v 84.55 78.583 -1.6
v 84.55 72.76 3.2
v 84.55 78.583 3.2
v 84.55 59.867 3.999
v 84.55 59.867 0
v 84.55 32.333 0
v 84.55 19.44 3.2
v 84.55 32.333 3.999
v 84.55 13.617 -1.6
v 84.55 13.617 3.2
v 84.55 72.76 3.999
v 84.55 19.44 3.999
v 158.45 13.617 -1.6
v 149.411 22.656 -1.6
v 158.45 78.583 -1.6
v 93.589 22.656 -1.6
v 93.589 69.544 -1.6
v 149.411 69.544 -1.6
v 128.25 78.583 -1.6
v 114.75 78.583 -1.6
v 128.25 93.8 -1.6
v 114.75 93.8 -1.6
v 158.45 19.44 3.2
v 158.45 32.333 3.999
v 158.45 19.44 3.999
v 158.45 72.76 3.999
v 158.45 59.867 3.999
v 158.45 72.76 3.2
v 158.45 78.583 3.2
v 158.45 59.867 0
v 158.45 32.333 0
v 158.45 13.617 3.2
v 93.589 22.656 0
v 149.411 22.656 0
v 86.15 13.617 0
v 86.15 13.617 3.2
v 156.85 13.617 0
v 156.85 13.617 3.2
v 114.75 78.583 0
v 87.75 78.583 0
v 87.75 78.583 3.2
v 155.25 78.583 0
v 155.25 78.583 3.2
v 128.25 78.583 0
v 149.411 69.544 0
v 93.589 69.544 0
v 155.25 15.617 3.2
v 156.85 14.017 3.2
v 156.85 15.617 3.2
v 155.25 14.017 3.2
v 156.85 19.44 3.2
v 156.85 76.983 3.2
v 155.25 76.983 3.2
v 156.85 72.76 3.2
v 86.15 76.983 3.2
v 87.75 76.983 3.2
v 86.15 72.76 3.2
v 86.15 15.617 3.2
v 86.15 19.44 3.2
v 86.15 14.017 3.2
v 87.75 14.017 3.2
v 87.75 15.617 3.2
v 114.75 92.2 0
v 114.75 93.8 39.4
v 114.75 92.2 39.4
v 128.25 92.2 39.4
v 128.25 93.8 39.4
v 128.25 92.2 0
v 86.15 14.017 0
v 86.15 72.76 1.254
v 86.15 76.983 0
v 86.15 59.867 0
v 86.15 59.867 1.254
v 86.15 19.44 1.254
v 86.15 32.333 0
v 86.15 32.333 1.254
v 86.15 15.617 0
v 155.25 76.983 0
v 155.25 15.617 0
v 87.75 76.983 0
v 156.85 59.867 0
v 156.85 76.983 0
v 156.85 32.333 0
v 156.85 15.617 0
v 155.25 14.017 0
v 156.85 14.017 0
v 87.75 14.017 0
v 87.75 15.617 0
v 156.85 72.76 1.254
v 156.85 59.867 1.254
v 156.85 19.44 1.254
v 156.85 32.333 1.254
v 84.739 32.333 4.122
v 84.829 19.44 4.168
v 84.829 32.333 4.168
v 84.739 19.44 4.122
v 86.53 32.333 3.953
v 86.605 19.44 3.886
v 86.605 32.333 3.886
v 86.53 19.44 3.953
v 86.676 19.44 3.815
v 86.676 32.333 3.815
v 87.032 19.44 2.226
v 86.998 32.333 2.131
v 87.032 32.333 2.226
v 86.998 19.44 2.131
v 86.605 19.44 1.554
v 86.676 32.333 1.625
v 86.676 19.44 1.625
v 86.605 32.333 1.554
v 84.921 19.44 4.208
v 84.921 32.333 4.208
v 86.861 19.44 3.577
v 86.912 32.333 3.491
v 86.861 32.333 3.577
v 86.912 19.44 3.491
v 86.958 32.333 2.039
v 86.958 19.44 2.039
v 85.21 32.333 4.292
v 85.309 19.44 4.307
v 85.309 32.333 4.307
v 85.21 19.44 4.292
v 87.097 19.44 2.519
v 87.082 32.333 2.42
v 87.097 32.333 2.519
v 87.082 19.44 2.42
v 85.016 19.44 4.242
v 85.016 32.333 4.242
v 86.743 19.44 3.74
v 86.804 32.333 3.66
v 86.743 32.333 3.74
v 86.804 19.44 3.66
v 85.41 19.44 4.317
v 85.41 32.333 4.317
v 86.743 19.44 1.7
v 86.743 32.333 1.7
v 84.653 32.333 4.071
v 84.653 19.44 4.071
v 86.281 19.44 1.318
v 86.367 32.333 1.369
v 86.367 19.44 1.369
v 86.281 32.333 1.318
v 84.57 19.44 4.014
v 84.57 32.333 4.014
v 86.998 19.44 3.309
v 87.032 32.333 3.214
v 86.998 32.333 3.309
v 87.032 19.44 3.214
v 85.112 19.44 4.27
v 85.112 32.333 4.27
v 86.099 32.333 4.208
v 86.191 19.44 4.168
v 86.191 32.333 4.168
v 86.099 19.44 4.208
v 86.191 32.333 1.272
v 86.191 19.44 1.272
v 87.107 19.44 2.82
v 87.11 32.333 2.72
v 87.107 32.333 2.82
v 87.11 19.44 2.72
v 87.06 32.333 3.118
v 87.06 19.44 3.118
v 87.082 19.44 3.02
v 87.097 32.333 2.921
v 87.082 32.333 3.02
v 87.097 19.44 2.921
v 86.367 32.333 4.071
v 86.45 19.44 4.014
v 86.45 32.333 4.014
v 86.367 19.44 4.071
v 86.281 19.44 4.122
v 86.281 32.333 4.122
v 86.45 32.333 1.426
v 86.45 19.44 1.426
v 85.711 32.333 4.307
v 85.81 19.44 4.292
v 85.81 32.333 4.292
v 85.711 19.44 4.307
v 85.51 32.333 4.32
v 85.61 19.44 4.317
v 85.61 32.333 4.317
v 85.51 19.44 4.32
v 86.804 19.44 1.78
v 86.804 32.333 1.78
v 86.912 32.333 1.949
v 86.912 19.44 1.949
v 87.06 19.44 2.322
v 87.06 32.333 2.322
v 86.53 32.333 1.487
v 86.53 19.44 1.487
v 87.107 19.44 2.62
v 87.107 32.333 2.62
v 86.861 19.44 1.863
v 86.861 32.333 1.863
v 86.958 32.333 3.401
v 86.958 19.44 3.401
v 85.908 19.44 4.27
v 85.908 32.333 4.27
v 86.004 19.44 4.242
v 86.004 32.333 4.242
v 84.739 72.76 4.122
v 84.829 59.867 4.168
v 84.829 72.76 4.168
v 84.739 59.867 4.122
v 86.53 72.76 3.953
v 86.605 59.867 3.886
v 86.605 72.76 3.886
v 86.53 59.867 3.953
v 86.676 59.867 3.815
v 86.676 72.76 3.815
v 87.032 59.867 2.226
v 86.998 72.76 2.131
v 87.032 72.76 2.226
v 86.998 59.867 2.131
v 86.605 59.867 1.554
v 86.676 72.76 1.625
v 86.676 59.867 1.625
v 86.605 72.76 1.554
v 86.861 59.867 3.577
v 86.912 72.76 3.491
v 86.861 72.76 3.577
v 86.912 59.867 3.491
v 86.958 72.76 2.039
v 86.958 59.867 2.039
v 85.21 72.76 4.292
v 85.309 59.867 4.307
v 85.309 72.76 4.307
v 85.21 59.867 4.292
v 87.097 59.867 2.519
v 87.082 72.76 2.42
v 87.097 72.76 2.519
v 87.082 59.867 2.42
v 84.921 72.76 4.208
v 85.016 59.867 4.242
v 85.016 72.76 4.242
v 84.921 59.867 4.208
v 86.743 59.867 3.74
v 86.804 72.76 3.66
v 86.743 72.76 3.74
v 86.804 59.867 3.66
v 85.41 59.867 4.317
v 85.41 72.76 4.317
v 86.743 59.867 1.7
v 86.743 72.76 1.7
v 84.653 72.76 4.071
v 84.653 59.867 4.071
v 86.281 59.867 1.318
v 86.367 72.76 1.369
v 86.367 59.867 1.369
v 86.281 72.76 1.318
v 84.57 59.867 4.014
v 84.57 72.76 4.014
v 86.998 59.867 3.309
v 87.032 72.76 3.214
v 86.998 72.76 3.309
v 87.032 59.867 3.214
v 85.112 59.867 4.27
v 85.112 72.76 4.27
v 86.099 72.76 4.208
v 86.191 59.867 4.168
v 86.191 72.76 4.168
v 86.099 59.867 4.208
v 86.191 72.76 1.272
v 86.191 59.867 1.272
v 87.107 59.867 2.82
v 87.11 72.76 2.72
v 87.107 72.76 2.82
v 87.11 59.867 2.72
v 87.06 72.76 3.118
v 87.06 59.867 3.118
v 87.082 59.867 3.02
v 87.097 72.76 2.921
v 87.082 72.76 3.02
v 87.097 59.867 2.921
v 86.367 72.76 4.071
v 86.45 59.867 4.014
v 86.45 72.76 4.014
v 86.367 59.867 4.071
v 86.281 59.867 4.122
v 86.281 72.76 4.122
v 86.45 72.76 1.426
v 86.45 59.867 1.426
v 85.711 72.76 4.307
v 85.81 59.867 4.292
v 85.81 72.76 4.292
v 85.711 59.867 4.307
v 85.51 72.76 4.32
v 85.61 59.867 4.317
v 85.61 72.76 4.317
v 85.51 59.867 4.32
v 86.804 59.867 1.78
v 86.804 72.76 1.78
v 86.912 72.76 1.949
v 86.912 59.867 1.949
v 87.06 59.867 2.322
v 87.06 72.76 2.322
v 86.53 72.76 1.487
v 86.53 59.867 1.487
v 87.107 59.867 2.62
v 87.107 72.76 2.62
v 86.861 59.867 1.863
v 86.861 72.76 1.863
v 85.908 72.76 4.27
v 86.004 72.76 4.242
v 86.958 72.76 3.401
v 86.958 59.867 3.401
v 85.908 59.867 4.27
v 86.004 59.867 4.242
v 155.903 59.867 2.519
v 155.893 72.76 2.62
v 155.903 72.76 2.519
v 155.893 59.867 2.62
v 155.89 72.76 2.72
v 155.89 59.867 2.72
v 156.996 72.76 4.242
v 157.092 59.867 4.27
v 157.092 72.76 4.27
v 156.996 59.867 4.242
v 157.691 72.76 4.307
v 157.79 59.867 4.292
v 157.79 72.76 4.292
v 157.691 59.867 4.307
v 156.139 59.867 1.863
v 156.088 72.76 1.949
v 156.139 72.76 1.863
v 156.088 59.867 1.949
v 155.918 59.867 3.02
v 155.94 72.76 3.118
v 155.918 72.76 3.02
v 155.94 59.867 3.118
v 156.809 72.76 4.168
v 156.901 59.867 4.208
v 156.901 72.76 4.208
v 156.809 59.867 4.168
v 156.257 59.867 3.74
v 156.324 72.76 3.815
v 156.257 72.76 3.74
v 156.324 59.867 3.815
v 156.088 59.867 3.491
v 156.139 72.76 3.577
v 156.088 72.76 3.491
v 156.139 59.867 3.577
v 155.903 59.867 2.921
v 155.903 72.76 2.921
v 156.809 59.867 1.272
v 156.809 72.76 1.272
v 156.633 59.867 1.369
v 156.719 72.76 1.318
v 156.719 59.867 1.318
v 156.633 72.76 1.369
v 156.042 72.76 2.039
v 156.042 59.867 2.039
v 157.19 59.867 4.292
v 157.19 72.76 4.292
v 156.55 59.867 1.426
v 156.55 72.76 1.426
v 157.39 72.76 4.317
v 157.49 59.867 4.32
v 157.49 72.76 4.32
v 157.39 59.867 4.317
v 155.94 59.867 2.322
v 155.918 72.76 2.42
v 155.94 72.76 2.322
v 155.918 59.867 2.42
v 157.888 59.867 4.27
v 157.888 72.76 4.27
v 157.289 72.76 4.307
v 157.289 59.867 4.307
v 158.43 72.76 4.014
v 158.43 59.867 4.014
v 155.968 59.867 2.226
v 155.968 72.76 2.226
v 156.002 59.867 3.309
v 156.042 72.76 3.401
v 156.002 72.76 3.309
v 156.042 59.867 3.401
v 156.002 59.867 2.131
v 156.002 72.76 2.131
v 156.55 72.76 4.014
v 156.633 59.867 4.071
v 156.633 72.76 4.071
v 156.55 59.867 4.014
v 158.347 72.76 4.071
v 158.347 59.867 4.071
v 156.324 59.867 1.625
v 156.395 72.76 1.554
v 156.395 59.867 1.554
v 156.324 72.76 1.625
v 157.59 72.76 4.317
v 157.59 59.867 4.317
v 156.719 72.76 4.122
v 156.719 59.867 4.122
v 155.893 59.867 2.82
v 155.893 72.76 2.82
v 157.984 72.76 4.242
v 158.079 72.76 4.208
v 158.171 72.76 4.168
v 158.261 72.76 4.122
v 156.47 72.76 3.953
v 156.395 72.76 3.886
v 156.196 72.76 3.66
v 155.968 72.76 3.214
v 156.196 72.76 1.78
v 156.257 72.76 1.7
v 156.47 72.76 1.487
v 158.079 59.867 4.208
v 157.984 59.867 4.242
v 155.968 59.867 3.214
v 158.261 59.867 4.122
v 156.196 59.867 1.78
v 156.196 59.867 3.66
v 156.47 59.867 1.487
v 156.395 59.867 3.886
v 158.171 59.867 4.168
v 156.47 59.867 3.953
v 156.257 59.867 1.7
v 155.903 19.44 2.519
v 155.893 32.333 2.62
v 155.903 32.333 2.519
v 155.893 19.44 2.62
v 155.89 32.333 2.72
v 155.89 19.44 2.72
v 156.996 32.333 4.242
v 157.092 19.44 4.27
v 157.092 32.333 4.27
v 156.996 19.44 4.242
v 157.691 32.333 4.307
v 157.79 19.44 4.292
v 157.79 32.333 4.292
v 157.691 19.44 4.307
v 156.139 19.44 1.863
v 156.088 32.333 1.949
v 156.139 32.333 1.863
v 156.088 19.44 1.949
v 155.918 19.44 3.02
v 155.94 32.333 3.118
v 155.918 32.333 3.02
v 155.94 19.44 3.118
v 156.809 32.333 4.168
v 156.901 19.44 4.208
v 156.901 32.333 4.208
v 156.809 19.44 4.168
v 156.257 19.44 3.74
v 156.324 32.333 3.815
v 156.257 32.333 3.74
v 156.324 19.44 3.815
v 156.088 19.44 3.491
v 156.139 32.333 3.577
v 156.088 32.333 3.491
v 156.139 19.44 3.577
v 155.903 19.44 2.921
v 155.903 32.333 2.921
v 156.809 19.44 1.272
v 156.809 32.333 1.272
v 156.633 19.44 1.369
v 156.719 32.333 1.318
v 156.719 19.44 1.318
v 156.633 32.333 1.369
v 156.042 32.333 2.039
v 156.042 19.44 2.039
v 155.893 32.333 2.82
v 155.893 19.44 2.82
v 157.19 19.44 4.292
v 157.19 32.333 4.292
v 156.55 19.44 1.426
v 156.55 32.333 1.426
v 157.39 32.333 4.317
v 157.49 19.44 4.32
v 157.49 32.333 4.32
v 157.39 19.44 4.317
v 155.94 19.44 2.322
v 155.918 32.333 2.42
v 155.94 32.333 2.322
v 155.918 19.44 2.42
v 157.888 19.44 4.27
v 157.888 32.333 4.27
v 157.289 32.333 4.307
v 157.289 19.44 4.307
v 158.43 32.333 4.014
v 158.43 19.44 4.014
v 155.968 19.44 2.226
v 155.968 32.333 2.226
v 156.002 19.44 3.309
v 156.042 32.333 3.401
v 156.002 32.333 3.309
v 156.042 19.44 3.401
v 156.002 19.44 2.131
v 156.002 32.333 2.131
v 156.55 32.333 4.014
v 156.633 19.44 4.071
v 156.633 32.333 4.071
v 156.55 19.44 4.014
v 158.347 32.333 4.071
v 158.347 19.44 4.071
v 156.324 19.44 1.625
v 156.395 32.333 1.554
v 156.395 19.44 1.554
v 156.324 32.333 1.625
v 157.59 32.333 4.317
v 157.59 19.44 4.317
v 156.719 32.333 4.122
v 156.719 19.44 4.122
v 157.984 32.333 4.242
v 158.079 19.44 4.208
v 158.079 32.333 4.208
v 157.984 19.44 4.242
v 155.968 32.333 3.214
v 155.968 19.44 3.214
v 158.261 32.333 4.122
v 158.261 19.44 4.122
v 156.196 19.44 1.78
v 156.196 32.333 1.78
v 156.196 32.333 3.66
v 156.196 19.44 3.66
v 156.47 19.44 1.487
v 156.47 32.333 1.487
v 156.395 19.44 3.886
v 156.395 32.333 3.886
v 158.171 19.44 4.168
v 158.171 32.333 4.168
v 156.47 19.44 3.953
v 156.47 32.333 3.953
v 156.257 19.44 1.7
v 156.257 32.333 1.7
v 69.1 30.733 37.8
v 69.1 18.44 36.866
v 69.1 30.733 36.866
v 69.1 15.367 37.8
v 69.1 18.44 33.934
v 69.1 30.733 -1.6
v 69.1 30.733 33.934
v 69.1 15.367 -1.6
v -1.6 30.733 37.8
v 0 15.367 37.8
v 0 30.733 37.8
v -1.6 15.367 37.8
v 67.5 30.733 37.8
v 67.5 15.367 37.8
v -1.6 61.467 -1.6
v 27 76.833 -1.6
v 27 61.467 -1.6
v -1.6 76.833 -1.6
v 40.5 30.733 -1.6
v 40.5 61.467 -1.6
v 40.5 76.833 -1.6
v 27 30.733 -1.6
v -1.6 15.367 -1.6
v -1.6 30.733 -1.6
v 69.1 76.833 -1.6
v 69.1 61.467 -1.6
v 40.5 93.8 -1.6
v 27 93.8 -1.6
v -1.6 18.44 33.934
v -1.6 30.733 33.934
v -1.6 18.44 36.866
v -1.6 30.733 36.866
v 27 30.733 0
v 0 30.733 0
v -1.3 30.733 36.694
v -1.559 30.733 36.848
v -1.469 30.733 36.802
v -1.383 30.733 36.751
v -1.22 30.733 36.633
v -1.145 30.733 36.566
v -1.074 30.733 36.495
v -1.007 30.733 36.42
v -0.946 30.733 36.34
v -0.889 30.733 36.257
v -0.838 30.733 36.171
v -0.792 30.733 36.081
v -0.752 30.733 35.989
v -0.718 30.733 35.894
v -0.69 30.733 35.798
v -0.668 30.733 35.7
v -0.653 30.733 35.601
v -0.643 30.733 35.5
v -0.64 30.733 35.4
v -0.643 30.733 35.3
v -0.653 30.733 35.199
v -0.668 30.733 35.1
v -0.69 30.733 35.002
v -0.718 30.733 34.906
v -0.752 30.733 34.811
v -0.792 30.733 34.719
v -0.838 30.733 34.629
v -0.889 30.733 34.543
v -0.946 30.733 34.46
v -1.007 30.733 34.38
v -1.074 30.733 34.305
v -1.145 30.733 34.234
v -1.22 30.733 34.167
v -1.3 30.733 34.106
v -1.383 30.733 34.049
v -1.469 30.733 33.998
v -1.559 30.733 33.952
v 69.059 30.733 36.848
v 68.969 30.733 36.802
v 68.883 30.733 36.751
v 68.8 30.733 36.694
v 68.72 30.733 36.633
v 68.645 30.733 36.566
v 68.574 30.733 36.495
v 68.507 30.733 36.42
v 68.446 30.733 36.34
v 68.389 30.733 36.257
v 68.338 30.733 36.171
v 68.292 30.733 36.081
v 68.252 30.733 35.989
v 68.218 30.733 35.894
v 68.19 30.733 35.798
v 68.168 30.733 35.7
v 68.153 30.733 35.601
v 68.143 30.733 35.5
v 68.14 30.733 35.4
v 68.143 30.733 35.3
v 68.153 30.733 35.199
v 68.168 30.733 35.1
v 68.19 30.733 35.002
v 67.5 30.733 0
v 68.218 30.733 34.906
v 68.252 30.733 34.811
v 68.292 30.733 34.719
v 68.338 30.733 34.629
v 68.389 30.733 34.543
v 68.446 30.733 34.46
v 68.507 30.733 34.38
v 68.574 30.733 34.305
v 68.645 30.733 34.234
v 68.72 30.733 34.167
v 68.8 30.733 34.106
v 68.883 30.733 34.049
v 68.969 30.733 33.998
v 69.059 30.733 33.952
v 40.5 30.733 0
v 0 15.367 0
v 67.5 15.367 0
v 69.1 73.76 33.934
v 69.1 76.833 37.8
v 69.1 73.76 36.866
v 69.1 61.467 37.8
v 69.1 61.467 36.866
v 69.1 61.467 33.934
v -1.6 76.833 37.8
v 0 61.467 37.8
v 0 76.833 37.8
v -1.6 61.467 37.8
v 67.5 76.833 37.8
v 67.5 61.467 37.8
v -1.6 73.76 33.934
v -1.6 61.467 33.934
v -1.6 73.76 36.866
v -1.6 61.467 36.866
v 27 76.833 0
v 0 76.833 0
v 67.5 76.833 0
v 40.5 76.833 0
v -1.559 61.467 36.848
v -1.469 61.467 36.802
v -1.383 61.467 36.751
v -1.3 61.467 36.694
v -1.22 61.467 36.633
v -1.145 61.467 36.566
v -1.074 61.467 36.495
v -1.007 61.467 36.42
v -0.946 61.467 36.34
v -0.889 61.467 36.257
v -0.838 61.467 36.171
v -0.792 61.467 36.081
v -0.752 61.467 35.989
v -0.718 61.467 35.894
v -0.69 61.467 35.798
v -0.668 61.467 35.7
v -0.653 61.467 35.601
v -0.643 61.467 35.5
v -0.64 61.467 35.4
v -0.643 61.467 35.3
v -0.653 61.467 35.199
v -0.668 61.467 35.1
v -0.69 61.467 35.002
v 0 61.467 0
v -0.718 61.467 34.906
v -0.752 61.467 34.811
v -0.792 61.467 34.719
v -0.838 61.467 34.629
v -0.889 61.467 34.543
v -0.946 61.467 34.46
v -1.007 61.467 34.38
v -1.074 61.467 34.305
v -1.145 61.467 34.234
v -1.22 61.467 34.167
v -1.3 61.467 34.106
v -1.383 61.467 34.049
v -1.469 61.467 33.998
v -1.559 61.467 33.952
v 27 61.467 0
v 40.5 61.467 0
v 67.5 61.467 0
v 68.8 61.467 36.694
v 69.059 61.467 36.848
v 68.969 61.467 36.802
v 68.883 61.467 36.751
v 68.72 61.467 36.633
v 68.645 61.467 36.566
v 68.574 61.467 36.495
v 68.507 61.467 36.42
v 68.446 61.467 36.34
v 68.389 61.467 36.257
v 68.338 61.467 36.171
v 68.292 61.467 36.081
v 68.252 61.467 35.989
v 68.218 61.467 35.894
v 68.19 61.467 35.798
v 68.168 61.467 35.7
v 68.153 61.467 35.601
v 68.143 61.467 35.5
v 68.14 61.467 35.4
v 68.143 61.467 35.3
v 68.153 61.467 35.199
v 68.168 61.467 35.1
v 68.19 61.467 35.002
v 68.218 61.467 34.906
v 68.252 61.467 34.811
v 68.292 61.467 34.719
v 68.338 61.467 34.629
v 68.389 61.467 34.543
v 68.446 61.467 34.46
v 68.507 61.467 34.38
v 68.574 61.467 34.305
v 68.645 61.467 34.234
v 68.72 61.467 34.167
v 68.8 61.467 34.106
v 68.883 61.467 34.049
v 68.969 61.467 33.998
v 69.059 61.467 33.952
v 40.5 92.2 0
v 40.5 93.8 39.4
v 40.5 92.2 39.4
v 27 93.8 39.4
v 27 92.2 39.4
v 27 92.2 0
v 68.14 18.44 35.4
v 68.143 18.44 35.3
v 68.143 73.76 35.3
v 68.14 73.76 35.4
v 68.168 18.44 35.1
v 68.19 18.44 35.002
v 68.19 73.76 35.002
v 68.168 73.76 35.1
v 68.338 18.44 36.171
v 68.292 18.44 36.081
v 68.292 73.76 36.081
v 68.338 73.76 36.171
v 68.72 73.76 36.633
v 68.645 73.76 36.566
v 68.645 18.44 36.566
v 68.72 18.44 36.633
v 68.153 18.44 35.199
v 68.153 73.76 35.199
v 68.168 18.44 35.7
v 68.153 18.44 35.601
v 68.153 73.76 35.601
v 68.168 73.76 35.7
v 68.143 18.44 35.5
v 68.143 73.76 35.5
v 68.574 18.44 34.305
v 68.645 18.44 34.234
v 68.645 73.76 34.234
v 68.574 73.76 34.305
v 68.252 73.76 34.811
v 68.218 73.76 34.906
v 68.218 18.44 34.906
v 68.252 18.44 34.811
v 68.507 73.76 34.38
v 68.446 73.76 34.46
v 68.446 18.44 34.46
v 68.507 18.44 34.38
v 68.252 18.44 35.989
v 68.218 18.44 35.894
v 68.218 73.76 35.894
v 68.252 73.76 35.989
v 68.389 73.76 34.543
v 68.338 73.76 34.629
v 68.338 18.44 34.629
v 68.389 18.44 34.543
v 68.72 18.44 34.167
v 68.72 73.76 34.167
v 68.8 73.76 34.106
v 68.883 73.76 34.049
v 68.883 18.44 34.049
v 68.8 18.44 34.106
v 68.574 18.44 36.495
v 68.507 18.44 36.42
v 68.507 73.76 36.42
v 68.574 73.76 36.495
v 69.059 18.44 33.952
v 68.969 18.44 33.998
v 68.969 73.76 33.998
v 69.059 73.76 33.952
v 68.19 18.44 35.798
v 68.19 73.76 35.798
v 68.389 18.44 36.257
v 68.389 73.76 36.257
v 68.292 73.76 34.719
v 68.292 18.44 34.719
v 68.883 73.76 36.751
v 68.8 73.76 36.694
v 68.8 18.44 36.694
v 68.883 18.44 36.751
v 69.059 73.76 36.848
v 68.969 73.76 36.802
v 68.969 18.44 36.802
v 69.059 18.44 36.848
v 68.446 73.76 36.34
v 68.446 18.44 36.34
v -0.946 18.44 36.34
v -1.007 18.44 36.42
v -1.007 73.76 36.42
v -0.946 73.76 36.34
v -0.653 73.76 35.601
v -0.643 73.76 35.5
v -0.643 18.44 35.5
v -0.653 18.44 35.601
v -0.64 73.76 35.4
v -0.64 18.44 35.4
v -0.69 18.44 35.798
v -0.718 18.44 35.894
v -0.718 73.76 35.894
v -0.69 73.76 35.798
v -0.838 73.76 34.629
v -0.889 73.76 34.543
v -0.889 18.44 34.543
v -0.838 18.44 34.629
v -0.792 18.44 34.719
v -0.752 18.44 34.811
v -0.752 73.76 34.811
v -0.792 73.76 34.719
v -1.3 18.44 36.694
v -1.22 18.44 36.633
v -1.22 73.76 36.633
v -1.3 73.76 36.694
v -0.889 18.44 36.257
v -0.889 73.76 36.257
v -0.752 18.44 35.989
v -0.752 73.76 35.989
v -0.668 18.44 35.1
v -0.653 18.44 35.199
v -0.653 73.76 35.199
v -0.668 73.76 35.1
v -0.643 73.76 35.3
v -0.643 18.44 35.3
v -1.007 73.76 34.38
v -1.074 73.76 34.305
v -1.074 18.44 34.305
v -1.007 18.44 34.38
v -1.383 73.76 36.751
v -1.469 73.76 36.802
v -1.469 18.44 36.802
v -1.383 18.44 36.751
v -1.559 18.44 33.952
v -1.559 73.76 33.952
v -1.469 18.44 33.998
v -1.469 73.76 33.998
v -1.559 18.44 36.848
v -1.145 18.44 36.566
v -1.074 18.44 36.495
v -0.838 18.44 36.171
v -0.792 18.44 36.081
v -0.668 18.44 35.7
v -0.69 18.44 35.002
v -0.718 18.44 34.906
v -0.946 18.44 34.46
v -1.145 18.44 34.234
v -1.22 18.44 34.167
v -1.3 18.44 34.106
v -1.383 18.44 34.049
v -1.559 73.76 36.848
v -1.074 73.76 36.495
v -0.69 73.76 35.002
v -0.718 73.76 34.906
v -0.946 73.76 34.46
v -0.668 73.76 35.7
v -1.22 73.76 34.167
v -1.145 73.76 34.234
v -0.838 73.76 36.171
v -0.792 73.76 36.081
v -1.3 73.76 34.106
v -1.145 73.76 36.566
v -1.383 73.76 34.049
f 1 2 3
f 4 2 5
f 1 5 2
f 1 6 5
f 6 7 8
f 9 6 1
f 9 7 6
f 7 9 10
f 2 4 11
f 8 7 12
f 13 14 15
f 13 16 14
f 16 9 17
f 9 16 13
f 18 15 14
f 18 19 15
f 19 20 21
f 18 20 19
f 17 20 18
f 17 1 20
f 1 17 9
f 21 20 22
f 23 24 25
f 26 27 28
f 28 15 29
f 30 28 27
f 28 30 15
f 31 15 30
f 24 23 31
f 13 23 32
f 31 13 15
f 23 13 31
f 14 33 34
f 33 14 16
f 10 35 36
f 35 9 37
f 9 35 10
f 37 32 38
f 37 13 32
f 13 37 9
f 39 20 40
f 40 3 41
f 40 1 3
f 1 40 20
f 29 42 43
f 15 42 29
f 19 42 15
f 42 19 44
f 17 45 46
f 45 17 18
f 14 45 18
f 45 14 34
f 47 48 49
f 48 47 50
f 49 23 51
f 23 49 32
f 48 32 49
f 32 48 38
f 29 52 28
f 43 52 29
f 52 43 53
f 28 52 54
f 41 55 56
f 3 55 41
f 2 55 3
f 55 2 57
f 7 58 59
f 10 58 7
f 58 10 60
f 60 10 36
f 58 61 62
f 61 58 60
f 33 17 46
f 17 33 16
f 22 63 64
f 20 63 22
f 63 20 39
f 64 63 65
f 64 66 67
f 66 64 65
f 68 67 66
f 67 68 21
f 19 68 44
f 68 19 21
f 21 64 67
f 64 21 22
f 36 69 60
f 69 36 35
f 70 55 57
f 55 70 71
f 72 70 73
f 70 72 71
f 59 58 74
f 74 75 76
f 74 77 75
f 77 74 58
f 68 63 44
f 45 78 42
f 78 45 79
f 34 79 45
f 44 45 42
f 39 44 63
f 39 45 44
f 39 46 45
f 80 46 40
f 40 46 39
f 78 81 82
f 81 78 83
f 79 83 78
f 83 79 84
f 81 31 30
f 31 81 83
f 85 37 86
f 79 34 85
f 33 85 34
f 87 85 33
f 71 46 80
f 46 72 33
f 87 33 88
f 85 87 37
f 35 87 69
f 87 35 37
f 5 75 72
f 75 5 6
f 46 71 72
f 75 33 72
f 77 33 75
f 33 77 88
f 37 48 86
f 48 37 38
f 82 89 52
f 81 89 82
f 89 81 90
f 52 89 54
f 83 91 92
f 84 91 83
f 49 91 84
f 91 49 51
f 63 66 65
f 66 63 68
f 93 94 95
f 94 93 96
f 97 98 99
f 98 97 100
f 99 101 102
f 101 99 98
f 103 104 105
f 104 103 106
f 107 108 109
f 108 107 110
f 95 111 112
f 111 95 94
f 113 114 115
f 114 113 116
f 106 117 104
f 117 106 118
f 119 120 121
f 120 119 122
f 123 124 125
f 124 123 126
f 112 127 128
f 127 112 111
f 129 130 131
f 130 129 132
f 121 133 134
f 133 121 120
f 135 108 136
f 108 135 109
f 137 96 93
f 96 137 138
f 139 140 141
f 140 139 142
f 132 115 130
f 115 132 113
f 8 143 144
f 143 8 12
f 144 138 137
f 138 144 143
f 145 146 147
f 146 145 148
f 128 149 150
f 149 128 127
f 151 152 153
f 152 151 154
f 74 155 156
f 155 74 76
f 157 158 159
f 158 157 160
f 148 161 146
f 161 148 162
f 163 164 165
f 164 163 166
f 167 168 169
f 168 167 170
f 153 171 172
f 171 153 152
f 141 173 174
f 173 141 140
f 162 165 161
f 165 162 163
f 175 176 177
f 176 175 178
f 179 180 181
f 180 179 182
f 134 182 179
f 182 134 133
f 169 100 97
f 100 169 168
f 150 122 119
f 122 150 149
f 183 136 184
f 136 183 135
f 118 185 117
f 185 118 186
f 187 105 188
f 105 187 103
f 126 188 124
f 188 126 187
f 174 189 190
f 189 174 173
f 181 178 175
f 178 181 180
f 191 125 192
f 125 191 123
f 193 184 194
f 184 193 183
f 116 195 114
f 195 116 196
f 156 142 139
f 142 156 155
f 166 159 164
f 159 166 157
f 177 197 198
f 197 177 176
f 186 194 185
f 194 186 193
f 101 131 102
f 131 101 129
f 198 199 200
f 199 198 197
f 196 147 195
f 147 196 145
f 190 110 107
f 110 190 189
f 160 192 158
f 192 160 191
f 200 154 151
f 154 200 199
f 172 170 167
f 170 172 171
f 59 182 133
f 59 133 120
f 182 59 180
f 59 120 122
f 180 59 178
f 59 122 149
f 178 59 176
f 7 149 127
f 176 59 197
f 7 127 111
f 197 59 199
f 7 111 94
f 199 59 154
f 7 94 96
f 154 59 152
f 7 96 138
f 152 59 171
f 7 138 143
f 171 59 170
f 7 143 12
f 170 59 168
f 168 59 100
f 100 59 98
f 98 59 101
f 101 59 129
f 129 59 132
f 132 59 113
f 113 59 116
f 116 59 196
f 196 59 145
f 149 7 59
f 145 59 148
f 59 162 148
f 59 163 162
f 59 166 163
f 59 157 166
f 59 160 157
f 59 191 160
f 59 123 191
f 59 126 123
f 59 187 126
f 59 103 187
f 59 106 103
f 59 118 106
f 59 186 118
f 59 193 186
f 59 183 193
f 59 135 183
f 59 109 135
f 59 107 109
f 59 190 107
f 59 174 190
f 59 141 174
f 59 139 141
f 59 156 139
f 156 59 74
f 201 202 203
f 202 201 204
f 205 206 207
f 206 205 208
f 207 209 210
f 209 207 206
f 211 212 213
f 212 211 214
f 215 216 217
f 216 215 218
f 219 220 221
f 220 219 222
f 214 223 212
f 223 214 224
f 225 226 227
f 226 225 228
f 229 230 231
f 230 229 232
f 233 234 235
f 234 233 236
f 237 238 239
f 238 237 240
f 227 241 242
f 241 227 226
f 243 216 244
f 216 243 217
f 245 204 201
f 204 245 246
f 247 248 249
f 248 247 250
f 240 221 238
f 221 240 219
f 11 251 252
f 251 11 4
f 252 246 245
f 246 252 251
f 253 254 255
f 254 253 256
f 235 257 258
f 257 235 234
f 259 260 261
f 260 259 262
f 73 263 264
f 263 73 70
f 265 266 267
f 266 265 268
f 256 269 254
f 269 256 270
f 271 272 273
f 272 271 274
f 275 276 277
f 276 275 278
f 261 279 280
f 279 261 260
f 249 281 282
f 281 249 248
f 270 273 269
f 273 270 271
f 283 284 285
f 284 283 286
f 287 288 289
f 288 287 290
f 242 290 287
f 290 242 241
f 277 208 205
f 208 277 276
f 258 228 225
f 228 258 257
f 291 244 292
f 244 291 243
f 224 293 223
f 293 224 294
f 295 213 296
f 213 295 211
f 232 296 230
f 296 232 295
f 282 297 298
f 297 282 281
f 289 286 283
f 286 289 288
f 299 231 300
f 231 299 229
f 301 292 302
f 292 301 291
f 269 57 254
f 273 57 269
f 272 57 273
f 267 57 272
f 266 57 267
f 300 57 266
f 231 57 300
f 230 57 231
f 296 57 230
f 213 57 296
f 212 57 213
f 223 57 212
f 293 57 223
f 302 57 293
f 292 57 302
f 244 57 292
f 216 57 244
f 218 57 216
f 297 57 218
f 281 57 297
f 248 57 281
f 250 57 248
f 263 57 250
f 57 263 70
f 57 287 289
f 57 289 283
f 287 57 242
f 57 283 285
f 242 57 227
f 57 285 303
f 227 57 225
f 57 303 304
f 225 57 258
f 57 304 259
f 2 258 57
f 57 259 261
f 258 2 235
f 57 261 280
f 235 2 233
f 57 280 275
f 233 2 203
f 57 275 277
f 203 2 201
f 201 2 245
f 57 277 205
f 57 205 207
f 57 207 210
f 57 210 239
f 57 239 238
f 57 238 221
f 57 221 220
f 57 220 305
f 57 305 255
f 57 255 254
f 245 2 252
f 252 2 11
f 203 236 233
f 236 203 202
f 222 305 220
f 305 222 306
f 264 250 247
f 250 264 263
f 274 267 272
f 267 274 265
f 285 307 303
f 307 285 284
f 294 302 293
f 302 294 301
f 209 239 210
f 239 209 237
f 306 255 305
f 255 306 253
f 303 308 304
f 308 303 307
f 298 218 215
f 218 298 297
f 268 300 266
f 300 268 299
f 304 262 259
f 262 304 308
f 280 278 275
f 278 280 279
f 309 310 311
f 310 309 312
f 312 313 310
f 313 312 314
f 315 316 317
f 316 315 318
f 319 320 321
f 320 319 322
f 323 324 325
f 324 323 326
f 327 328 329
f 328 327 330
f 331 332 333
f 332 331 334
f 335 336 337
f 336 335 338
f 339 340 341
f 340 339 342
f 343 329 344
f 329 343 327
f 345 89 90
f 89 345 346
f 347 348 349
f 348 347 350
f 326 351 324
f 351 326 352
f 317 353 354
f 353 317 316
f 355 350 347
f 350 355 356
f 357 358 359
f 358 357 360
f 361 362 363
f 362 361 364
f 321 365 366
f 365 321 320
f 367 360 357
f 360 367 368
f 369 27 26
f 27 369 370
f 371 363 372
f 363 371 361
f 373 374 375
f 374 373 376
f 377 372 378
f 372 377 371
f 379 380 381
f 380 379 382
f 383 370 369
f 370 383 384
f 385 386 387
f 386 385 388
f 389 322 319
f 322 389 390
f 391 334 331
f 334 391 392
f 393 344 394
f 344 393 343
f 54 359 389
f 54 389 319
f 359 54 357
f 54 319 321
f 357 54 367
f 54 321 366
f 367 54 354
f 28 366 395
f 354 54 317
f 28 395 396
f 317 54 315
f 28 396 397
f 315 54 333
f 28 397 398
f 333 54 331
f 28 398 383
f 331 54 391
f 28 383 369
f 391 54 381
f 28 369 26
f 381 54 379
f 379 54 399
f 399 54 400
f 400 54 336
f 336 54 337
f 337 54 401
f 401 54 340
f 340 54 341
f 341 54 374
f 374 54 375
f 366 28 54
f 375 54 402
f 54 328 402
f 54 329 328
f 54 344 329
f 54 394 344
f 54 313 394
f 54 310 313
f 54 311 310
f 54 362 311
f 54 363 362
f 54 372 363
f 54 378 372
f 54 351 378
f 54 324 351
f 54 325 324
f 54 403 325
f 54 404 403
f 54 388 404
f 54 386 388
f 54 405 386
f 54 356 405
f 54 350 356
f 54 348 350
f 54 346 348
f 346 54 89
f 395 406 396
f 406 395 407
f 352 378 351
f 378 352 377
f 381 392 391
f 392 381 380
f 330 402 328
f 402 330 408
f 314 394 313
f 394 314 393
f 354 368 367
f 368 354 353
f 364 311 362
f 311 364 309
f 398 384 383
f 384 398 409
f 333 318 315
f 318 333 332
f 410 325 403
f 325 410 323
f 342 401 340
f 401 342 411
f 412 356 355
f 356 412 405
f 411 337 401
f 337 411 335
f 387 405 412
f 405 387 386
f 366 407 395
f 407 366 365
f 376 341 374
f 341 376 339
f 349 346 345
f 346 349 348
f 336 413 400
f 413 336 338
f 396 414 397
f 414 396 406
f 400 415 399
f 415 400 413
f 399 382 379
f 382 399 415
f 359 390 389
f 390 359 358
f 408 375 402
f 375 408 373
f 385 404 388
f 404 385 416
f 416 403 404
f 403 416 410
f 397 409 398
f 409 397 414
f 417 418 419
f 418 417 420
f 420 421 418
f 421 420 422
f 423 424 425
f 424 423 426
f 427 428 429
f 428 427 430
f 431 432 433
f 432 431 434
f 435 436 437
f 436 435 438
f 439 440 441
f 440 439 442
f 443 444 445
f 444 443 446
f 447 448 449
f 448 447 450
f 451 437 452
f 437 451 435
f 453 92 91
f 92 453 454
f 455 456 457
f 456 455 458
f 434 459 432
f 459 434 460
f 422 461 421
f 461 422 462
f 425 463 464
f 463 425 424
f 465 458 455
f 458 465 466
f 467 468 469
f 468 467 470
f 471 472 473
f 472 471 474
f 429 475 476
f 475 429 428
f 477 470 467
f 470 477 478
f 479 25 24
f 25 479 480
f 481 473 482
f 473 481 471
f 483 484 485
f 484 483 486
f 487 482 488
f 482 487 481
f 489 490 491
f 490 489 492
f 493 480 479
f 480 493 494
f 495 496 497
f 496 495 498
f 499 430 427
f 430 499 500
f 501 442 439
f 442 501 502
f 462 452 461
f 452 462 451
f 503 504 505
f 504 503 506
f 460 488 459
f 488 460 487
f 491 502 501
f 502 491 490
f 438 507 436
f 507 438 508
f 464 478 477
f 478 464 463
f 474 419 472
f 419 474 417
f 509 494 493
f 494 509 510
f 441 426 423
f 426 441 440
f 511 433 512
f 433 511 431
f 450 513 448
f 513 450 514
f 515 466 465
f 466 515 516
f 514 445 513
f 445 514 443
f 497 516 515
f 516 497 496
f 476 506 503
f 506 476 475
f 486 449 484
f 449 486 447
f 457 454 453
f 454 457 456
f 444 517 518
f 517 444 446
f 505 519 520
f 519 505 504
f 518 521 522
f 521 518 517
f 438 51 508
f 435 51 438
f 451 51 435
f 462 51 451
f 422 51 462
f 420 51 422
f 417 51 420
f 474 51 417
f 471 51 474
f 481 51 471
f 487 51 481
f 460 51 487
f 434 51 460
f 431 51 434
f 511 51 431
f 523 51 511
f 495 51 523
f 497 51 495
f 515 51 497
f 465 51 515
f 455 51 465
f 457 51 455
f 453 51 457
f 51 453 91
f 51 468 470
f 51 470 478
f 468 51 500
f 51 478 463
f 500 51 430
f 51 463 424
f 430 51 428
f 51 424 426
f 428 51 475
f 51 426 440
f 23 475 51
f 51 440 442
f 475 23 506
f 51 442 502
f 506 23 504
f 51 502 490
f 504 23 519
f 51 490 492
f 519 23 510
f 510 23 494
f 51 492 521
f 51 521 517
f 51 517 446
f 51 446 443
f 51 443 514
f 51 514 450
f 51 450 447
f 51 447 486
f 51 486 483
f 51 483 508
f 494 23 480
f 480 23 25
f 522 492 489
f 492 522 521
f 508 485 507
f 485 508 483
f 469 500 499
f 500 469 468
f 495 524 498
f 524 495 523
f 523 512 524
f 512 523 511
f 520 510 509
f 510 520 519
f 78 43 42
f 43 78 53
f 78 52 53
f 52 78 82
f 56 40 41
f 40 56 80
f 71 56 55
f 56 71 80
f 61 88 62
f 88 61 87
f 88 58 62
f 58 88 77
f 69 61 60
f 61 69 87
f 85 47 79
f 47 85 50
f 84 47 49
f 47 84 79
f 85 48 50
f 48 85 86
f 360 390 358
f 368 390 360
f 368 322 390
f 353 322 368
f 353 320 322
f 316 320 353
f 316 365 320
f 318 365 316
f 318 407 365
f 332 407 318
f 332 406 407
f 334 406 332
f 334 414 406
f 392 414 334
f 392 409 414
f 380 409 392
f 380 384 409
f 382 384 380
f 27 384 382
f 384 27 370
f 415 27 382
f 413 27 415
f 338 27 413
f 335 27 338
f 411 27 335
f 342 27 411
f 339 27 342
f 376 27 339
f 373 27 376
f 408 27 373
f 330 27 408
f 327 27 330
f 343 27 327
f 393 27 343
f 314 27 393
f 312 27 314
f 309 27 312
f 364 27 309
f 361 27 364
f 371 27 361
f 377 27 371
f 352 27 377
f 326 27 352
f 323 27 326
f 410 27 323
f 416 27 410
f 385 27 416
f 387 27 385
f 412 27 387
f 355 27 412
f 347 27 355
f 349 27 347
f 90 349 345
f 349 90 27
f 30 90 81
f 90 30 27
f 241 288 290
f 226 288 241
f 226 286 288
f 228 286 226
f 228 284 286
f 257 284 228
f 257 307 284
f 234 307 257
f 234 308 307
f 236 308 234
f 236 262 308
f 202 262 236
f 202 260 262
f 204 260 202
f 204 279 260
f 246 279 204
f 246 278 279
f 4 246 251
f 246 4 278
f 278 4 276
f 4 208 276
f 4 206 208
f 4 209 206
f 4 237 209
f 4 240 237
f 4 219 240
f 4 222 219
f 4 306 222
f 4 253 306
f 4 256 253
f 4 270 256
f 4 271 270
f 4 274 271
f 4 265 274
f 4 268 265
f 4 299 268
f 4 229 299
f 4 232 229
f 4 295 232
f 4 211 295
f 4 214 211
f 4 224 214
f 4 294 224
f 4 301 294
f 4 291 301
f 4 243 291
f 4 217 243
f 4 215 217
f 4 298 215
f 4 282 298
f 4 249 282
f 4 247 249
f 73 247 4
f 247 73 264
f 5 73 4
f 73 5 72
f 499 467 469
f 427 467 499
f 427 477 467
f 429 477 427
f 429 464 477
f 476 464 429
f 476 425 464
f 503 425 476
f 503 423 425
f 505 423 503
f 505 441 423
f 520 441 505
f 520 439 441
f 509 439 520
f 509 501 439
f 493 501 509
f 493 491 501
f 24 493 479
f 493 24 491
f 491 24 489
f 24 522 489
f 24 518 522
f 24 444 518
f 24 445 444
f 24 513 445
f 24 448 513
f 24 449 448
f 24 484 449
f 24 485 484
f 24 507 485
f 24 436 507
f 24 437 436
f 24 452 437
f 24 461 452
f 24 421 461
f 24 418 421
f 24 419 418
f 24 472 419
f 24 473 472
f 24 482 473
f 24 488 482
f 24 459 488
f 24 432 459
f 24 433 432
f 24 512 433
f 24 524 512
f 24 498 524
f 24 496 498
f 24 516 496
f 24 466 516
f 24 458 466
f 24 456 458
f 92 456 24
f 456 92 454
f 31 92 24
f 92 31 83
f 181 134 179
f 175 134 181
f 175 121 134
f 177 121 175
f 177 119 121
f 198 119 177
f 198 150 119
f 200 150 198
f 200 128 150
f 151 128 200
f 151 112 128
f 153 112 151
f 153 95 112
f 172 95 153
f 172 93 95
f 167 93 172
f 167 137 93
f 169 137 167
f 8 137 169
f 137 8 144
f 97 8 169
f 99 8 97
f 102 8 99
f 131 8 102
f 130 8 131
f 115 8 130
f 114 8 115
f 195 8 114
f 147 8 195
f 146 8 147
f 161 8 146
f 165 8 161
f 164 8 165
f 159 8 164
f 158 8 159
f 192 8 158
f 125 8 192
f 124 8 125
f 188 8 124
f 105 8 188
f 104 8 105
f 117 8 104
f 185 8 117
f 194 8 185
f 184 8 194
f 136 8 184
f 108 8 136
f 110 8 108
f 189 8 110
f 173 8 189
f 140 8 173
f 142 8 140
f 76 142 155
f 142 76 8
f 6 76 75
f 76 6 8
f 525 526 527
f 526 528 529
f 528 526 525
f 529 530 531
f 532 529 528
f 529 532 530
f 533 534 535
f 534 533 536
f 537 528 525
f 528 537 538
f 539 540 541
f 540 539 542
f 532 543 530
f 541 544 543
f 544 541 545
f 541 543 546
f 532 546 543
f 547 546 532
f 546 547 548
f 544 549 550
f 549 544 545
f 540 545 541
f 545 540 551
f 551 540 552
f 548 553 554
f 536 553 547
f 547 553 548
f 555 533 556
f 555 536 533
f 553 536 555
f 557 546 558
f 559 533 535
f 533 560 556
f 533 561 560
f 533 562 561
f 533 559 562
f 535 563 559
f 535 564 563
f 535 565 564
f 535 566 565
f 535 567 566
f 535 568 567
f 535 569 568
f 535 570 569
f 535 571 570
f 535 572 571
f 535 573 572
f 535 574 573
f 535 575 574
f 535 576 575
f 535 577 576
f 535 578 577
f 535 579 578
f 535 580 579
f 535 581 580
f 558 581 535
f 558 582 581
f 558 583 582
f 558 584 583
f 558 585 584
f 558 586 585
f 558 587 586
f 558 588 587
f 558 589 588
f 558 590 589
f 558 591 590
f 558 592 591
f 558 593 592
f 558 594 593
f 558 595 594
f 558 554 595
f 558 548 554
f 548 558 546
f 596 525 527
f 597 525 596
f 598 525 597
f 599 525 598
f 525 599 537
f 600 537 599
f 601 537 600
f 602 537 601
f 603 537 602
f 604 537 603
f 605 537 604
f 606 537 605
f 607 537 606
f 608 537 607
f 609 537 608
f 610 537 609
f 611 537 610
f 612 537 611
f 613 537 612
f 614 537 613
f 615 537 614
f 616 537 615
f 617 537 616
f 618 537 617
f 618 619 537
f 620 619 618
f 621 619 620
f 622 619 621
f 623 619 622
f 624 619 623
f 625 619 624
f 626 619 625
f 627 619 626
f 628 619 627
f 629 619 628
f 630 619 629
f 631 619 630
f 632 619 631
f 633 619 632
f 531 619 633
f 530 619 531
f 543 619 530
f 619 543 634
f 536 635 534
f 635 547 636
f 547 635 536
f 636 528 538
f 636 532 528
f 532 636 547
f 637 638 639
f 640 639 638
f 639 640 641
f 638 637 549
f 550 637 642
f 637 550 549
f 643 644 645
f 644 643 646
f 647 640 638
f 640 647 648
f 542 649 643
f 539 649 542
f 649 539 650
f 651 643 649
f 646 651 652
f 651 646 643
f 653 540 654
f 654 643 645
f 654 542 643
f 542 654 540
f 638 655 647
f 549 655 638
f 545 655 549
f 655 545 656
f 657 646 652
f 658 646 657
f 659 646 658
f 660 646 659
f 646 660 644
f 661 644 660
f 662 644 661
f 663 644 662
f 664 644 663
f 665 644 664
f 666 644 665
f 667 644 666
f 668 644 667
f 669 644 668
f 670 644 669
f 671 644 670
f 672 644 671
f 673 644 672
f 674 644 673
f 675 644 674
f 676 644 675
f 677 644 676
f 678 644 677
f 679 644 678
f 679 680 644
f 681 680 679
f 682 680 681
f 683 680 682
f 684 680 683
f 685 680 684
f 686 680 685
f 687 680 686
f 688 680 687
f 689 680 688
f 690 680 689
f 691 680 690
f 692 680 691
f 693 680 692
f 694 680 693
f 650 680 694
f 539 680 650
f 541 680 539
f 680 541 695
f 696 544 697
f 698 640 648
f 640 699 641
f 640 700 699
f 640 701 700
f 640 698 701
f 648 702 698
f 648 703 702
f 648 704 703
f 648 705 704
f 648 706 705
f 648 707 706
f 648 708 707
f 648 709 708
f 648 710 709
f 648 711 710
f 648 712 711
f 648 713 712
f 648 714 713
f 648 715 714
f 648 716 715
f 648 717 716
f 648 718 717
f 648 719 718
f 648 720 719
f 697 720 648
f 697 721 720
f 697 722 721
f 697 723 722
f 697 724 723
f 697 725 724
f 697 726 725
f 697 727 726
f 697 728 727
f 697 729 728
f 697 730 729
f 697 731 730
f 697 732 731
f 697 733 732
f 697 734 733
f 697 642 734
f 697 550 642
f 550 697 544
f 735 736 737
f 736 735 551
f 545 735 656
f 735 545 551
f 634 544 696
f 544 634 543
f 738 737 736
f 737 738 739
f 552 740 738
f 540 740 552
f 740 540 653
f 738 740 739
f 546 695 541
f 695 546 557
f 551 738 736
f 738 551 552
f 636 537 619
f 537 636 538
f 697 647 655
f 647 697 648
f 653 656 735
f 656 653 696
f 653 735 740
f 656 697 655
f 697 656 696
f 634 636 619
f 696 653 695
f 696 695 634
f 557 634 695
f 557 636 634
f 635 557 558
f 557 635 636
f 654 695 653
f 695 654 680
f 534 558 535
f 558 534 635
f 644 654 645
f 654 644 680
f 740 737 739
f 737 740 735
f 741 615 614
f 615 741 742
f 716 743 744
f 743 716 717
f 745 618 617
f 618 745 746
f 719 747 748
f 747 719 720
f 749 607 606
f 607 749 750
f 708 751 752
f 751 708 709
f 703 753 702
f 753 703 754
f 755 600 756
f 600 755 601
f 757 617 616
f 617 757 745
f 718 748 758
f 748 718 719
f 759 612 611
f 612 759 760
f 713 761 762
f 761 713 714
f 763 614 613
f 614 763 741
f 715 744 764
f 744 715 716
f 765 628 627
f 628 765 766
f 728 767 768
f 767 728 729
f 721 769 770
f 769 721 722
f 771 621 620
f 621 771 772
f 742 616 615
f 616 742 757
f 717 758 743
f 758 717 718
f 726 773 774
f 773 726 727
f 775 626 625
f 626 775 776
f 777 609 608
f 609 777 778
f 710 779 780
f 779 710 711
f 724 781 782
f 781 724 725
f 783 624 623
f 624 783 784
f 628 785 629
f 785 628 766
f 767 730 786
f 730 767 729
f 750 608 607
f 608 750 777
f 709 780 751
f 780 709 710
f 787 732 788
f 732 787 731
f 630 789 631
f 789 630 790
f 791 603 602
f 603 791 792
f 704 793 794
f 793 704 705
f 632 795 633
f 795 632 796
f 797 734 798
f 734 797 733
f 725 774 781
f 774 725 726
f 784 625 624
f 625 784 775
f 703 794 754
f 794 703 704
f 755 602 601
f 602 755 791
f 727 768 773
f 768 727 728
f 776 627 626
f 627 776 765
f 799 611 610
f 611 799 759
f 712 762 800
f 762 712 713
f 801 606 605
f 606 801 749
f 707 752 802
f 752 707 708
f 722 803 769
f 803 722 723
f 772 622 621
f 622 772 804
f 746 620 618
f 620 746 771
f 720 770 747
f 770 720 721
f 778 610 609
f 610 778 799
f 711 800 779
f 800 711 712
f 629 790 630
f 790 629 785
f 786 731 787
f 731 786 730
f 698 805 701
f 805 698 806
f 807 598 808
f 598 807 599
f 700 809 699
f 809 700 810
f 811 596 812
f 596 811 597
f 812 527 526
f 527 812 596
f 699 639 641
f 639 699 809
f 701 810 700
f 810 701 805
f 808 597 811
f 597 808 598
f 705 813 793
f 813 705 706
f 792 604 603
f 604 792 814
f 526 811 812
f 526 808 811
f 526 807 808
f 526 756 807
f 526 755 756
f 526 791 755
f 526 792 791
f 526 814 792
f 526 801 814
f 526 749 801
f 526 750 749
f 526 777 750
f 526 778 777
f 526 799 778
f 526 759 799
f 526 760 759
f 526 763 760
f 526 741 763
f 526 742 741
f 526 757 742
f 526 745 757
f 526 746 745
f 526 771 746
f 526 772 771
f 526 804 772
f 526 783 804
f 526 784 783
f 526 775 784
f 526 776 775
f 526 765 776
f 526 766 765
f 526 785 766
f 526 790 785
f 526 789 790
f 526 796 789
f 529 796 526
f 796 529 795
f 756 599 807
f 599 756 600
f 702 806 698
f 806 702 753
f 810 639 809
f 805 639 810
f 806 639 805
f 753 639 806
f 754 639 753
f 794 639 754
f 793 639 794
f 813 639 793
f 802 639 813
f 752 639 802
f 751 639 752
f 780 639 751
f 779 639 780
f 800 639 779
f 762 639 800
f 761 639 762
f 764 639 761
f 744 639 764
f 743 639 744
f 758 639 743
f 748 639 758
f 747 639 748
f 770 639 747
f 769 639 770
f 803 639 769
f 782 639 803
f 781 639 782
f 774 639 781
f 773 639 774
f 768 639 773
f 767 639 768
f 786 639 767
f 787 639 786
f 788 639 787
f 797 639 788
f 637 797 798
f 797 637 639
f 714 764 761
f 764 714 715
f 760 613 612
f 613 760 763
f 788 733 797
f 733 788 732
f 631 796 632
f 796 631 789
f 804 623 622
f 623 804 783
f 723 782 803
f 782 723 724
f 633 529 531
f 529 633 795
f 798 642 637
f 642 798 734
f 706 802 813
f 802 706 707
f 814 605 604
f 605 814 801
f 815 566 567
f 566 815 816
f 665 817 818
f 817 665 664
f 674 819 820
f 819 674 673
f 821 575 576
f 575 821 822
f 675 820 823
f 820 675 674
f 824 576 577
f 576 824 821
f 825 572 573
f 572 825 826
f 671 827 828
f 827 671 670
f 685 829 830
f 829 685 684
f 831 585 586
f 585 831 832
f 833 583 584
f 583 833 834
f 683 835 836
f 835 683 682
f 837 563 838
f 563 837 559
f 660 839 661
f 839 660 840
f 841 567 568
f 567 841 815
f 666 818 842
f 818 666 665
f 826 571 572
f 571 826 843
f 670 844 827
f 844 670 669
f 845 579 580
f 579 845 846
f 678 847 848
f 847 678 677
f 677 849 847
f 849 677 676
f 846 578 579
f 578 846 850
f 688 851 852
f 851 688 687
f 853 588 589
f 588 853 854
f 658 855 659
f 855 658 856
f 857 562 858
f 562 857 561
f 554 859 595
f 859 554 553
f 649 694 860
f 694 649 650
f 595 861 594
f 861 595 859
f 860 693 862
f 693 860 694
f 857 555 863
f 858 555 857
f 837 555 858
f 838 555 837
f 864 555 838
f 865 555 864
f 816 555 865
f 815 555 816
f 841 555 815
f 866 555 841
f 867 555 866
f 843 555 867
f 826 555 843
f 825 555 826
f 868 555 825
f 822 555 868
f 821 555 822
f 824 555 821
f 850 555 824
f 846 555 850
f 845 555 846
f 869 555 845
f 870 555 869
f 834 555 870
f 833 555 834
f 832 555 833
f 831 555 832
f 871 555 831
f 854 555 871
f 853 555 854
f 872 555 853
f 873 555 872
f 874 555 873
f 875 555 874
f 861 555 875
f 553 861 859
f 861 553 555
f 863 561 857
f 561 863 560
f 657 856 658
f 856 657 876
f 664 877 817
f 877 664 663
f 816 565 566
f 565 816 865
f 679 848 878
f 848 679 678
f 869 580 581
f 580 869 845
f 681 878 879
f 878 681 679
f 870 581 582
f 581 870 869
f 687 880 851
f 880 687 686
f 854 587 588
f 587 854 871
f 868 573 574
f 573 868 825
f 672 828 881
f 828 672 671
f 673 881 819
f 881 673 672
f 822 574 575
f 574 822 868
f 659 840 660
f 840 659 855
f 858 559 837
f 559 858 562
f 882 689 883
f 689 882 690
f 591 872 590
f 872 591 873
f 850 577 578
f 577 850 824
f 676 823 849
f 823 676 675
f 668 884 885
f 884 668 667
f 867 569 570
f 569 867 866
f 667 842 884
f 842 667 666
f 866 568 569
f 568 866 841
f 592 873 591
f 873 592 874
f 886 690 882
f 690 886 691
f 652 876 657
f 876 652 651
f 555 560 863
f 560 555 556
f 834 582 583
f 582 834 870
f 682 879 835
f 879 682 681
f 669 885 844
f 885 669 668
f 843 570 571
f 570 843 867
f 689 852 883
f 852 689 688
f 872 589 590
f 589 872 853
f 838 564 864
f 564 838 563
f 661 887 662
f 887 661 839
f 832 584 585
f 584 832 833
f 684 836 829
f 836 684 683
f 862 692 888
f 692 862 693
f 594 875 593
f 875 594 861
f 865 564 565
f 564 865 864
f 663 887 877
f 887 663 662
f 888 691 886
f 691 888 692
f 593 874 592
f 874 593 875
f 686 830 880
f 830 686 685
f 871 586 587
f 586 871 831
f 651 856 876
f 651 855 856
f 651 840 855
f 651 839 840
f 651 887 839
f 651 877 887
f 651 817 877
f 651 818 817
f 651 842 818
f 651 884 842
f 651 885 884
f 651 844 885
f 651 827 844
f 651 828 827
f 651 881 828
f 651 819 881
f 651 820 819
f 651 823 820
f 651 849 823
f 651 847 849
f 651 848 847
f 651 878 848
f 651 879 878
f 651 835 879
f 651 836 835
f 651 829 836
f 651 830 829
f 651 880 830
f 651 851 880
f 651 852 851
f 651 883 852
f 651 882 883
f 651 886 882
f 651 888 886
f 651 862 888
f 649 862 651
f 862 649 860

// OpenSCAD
// SDE big cards sleeved : 66*90.7 tol 1.5

// Width of a card
card_width = 66;
// Length of a card
card_length = 90.7;
// Total height of the stack of cards you need a box for
stack_height = 36.3;
// The size of the support that will go beneath the card box
support_size = 28;
// This value will be added to the width, length and height. It should probably never be 0 if your values are precise.
tolerance = 1.5;
// The thickness of the printed parts, 1.6 is good for a 0.4 nozzle with a shell thikness of 0.8
thickness = 1.6;
// Which parts do you want to print ?
wut2print = "boxncover"; // [box:Bottom part,lid:Lid,boxncover:Bottom and lid,support:Support,every:Everything]


print_part();

cardwidth = card_width;
cardlength = card_length;
cardheight = stack_height;
support = support_size;

tol = tolerance;
thick1 = thickness;

cardw1 = cardwidth+tol;
cardl1 = cardlength+tol;
cardh1 = cardheight+tol;
cardldiv1 = cardl1/6;
cardwdiv1 = cardw1/5;

module print_part(){

if (wut2print == "box") {
bottom(cardw1, cardl1, cardh1, thick1, cardldiv1, cardwdiv1);
}
else if (wut2print == "lid") {
    translate([cardw1*2.3,0,cardh1]) rotate([0,180,0]) top(cardw1, cardl1, cardh1, thick1, cardldiv1, cardwdiv1);
}
else if (wut2print == "boxncover") {
    translate([cardw1*2.3,0,cardh1]) rotate([0,180,0]) top(cardw1, cardl1, cardh1, thick1, cardldiv1, cardwdiv1);
    bottom(cardw1, cardl1, cardh1, thick1, cardldiv1, cardwdiv1);
}
else if (wut2print == "support") {
support(cardw1, cardl1, cardh1, thick1, cardldiv1, cardwdiv1, support);
}
else if (wut2print == "every") {
    bottom(cardw1, cardl1, cardh1, thick1, cardldiv1, cardwdiv1);
    translate([cardw1*2.3,0,cardh1]) rotate([0,180,0]) top(cardw1, cardl1, cardh1, thick1, cardldiv1, cardwdiv1);
    translate([0,-cardldiv1*5,support]) support(cardw1, cardl1, cardh1, thick1, cardldiv1, cardwdiv1, support);
}

}


module bottom(cardw, cardl, cardh, thick, cardldiv, cardwdiv)
{
    difference(){
    union(){
        translate([-thick,cardldiv,-thick]) cube([cardw+thick*2,cardldiv,cardh+thick]);
        translate([-thick,cardldiv*4,-thick]) cube([cardw+thick*2,cardldiv,cardh+thick]);
        translate([cardwdiv*2,cardldiv,-thick]) cube([cardwdiv,cardl-cardldiv+thick,cardh+thick*2]);
    }
    translate([0,-5,0]) cube([cardw,cardl+5,cardh+5]);
    translate([cardw+thick*1.4,cardldiv*5-cardldiv/5,cardh-thick*1.5]) rotate([90,0,0]) cylinder($fn = 100, r = thick, h = cardldiv*4-2*(cardldiv/5));
    translate([-thick*1.4,cardldiv*5-cardldiv/5,cardh-thick*1.5]) rotate([90,0,0]) cylinder($fn = 100, r = thick, h = cardldiv*4-2*(cardldiv/5));
    }
}

module top(cardw, cardl, cardh, thick, cardldiv, cardwdiv)
{
difference(){
union(){
    difference(){
        union(){
            translate([-thick*2,cardldiv1-thick-tol/10,cardh-thick]) cube([cardw+thick*4,cardldiv1/1.7,thick*2]);
            translate([-thick*2,cardldiv1*5-cardldiv1/1.7+thick+tol/10,cardh-thick]) cube([cardw+thick*4,cardldiv1/1.7,thick*2]);
            translate([-thick*2,cardldiv1-thick-tol/10,cardh-thick*2]) cube([cardldiv1/1.7,cardldiv1*4+thick*2+tol/5,thick*3]);
            translate([cardw+thick*2-cardldiv1/1.7,cardldiv1-thick-tol/10,cardh-thick*2]) cube([cardldiv1/1.7,cardldiv1*4+thick*2+tol/5,thick*3]);
            translate([cardwdiv*2,cardldiv1*5-cardldiv1/1.7+thick+tol/10,-thick]) cube([cardwdiv,cardl1-(cardldiv1*5-cardldiv1/1.7+thick+tol/10)+thick,cardh+thick*2]);
        }
        translate([-thick,0,-thick*2]) cube([cardw+thick*2,cardl,cardh+thick*2]);
        //#translate([cardldiv1/1.7-thick*2,cardldiv1+cardldiv1/1.7-thick-tol/10,thick*2]) cube([cardw1+thick*4-cardldiv1/1.7*2,cardldiv1*4-cardldiv1/1.7-thick+tol/2,cardh+thick*2]);
    }
    translate([cardw+thick*1.4,cardldiv*2+cardldiv/5+1,cardh-thick*1.7]) rotate([90,0,0]) cylinder($fn = 100, r = thick, h = cardldiv);
    translate([cardw+thick*1.4,cardldiv*5-cardldiv/5-1,cardh-thick*1.7]) rotate([90,0,0]) cylinder($fn = 100, r = thick, h = cardldiv);
    translate([-thick*1.4,cardldiv*5-cardldiv/5-1,cardh-thick*1.7]) rotate([90,0,0]) cylinder($fn = 100, r = thick, h = cardldiv);
    translate([-thick*1.4,cardldiv*2+cardldiv/5+1,cardh-thick*1.7]) rotate([90,0,0]) cylinder($fn = 100, r = thick, h = cardldiv);

translate([-thick*2,cardldiv*5+tol/10,cardh-thick*2]) cube([thick*2,thick,thick*3]);
    translate([cardw,cardldiv*5+tol/10,cardh-thick*2]) cube([thick*2,thick,thick*3]);
    translate([cardw,cardldiv-tol+tol/10,cardh-thick*2]) cube([thick*2,thick,thick*3]);
    translate([-thick*2,cardldiv-tol+tol/10,cardh-thick*2]) cube([thick*2,thick,thick*3]);
}
translate([cardw+thick*2,0,0]) cube([10,cardl,cardh*1.1]);
translate([-thick*3,cardldiv*2+thick,0]) cube([cardw*1.2,cardldiv*2-thick*2,cardh]);

translate([-10-thick*2,0,0]) cube([10,cardl,cardh*1.1]);
}
}

module support(cardw, cardl, cardh, thick, cardldiv, cardwdiv, sup)
{
    difference(){
        union(){
            translate([0,cardldiv-2,-sup-thick]) cube([cardwdiv/2, cardldiv+4, sup+thick-0.1]);
            translate([cardwdiv*4.5,cardldiv-2,-sup-thick]) cube([cardwdiv/2, cardldiv+4, sup+thick-0.1]);
            translate([cardwdiv*4.5,cardldiv*4-2,-sup-thick]) cube([cardwdiv/2, cardldiv+4, sup+thick-0.1]);
            translate([0,cardldiv*4-2,-sup-thick]) cube([cardwdiv/2, cardldiv+4, sup+thick-0.1]);
            hull(){
            translate([0,cardldiv*4-2,-sup-thick]) cube([cardwdiv/2, cardldiv+4, 1]);
            translate([cardwdiv*4.5,cardldiv-2,-sup-thick]) cube([cardwdiv/2, cardldiv+4, 1]);}
            hull(){
                translate([0,cardldiv-2,-sup-thick]) cube([cardwdiv/2, cardldiv+4, 1]);
                translate([cardwdiv*4.5,cardldiv*4-2,-sup-thick]) cube([cardwdiv/2, cardldiv+4, 1]);}
            translate([cardwdiv*2-2,cardldiv*2.65,-sup-thick]) cube([cardwdiv+4, cardldiv/1.5, sup+thick-0.1]);
        }
        
    difference(){
    union(){
        translate([-thick,cardldiv-0.7,-thick]) cube([cardw+thick*2,cardldiv+1.4,cardh+thick]);
        translate([-thick,cardldiv*4-0.7,-thick]) cube([cardw+thick*2,cardldiv+1.4,cardh+thick]);
        translate([cardwdiv*2-0.7,cardldiv,-thick]) cube([cardwdiv+1.4,cardl-cardldiv+thick,cardh+thick*2]);
    }
    translate([0,-5,0]) cube([cardw,cardl+5,cardh+5]);
    translate([cardw+thick*1.4,cardldiv*5-cardldiv/5,cardh-thick*1.5]) rotate([90,0,0]) cylinder($fn = 100, r = thick, h = cardldiv*4-2*(cardldiv/5));
    translate([-thick*1.4,cardldiv*5-cardldiv/5,cardh-thick*1.5]) rotate([90,0,0]) cylinder($fn = 100, r = thick, h = cardldiv*4-2*(cardldiv/5));
    }
}}
